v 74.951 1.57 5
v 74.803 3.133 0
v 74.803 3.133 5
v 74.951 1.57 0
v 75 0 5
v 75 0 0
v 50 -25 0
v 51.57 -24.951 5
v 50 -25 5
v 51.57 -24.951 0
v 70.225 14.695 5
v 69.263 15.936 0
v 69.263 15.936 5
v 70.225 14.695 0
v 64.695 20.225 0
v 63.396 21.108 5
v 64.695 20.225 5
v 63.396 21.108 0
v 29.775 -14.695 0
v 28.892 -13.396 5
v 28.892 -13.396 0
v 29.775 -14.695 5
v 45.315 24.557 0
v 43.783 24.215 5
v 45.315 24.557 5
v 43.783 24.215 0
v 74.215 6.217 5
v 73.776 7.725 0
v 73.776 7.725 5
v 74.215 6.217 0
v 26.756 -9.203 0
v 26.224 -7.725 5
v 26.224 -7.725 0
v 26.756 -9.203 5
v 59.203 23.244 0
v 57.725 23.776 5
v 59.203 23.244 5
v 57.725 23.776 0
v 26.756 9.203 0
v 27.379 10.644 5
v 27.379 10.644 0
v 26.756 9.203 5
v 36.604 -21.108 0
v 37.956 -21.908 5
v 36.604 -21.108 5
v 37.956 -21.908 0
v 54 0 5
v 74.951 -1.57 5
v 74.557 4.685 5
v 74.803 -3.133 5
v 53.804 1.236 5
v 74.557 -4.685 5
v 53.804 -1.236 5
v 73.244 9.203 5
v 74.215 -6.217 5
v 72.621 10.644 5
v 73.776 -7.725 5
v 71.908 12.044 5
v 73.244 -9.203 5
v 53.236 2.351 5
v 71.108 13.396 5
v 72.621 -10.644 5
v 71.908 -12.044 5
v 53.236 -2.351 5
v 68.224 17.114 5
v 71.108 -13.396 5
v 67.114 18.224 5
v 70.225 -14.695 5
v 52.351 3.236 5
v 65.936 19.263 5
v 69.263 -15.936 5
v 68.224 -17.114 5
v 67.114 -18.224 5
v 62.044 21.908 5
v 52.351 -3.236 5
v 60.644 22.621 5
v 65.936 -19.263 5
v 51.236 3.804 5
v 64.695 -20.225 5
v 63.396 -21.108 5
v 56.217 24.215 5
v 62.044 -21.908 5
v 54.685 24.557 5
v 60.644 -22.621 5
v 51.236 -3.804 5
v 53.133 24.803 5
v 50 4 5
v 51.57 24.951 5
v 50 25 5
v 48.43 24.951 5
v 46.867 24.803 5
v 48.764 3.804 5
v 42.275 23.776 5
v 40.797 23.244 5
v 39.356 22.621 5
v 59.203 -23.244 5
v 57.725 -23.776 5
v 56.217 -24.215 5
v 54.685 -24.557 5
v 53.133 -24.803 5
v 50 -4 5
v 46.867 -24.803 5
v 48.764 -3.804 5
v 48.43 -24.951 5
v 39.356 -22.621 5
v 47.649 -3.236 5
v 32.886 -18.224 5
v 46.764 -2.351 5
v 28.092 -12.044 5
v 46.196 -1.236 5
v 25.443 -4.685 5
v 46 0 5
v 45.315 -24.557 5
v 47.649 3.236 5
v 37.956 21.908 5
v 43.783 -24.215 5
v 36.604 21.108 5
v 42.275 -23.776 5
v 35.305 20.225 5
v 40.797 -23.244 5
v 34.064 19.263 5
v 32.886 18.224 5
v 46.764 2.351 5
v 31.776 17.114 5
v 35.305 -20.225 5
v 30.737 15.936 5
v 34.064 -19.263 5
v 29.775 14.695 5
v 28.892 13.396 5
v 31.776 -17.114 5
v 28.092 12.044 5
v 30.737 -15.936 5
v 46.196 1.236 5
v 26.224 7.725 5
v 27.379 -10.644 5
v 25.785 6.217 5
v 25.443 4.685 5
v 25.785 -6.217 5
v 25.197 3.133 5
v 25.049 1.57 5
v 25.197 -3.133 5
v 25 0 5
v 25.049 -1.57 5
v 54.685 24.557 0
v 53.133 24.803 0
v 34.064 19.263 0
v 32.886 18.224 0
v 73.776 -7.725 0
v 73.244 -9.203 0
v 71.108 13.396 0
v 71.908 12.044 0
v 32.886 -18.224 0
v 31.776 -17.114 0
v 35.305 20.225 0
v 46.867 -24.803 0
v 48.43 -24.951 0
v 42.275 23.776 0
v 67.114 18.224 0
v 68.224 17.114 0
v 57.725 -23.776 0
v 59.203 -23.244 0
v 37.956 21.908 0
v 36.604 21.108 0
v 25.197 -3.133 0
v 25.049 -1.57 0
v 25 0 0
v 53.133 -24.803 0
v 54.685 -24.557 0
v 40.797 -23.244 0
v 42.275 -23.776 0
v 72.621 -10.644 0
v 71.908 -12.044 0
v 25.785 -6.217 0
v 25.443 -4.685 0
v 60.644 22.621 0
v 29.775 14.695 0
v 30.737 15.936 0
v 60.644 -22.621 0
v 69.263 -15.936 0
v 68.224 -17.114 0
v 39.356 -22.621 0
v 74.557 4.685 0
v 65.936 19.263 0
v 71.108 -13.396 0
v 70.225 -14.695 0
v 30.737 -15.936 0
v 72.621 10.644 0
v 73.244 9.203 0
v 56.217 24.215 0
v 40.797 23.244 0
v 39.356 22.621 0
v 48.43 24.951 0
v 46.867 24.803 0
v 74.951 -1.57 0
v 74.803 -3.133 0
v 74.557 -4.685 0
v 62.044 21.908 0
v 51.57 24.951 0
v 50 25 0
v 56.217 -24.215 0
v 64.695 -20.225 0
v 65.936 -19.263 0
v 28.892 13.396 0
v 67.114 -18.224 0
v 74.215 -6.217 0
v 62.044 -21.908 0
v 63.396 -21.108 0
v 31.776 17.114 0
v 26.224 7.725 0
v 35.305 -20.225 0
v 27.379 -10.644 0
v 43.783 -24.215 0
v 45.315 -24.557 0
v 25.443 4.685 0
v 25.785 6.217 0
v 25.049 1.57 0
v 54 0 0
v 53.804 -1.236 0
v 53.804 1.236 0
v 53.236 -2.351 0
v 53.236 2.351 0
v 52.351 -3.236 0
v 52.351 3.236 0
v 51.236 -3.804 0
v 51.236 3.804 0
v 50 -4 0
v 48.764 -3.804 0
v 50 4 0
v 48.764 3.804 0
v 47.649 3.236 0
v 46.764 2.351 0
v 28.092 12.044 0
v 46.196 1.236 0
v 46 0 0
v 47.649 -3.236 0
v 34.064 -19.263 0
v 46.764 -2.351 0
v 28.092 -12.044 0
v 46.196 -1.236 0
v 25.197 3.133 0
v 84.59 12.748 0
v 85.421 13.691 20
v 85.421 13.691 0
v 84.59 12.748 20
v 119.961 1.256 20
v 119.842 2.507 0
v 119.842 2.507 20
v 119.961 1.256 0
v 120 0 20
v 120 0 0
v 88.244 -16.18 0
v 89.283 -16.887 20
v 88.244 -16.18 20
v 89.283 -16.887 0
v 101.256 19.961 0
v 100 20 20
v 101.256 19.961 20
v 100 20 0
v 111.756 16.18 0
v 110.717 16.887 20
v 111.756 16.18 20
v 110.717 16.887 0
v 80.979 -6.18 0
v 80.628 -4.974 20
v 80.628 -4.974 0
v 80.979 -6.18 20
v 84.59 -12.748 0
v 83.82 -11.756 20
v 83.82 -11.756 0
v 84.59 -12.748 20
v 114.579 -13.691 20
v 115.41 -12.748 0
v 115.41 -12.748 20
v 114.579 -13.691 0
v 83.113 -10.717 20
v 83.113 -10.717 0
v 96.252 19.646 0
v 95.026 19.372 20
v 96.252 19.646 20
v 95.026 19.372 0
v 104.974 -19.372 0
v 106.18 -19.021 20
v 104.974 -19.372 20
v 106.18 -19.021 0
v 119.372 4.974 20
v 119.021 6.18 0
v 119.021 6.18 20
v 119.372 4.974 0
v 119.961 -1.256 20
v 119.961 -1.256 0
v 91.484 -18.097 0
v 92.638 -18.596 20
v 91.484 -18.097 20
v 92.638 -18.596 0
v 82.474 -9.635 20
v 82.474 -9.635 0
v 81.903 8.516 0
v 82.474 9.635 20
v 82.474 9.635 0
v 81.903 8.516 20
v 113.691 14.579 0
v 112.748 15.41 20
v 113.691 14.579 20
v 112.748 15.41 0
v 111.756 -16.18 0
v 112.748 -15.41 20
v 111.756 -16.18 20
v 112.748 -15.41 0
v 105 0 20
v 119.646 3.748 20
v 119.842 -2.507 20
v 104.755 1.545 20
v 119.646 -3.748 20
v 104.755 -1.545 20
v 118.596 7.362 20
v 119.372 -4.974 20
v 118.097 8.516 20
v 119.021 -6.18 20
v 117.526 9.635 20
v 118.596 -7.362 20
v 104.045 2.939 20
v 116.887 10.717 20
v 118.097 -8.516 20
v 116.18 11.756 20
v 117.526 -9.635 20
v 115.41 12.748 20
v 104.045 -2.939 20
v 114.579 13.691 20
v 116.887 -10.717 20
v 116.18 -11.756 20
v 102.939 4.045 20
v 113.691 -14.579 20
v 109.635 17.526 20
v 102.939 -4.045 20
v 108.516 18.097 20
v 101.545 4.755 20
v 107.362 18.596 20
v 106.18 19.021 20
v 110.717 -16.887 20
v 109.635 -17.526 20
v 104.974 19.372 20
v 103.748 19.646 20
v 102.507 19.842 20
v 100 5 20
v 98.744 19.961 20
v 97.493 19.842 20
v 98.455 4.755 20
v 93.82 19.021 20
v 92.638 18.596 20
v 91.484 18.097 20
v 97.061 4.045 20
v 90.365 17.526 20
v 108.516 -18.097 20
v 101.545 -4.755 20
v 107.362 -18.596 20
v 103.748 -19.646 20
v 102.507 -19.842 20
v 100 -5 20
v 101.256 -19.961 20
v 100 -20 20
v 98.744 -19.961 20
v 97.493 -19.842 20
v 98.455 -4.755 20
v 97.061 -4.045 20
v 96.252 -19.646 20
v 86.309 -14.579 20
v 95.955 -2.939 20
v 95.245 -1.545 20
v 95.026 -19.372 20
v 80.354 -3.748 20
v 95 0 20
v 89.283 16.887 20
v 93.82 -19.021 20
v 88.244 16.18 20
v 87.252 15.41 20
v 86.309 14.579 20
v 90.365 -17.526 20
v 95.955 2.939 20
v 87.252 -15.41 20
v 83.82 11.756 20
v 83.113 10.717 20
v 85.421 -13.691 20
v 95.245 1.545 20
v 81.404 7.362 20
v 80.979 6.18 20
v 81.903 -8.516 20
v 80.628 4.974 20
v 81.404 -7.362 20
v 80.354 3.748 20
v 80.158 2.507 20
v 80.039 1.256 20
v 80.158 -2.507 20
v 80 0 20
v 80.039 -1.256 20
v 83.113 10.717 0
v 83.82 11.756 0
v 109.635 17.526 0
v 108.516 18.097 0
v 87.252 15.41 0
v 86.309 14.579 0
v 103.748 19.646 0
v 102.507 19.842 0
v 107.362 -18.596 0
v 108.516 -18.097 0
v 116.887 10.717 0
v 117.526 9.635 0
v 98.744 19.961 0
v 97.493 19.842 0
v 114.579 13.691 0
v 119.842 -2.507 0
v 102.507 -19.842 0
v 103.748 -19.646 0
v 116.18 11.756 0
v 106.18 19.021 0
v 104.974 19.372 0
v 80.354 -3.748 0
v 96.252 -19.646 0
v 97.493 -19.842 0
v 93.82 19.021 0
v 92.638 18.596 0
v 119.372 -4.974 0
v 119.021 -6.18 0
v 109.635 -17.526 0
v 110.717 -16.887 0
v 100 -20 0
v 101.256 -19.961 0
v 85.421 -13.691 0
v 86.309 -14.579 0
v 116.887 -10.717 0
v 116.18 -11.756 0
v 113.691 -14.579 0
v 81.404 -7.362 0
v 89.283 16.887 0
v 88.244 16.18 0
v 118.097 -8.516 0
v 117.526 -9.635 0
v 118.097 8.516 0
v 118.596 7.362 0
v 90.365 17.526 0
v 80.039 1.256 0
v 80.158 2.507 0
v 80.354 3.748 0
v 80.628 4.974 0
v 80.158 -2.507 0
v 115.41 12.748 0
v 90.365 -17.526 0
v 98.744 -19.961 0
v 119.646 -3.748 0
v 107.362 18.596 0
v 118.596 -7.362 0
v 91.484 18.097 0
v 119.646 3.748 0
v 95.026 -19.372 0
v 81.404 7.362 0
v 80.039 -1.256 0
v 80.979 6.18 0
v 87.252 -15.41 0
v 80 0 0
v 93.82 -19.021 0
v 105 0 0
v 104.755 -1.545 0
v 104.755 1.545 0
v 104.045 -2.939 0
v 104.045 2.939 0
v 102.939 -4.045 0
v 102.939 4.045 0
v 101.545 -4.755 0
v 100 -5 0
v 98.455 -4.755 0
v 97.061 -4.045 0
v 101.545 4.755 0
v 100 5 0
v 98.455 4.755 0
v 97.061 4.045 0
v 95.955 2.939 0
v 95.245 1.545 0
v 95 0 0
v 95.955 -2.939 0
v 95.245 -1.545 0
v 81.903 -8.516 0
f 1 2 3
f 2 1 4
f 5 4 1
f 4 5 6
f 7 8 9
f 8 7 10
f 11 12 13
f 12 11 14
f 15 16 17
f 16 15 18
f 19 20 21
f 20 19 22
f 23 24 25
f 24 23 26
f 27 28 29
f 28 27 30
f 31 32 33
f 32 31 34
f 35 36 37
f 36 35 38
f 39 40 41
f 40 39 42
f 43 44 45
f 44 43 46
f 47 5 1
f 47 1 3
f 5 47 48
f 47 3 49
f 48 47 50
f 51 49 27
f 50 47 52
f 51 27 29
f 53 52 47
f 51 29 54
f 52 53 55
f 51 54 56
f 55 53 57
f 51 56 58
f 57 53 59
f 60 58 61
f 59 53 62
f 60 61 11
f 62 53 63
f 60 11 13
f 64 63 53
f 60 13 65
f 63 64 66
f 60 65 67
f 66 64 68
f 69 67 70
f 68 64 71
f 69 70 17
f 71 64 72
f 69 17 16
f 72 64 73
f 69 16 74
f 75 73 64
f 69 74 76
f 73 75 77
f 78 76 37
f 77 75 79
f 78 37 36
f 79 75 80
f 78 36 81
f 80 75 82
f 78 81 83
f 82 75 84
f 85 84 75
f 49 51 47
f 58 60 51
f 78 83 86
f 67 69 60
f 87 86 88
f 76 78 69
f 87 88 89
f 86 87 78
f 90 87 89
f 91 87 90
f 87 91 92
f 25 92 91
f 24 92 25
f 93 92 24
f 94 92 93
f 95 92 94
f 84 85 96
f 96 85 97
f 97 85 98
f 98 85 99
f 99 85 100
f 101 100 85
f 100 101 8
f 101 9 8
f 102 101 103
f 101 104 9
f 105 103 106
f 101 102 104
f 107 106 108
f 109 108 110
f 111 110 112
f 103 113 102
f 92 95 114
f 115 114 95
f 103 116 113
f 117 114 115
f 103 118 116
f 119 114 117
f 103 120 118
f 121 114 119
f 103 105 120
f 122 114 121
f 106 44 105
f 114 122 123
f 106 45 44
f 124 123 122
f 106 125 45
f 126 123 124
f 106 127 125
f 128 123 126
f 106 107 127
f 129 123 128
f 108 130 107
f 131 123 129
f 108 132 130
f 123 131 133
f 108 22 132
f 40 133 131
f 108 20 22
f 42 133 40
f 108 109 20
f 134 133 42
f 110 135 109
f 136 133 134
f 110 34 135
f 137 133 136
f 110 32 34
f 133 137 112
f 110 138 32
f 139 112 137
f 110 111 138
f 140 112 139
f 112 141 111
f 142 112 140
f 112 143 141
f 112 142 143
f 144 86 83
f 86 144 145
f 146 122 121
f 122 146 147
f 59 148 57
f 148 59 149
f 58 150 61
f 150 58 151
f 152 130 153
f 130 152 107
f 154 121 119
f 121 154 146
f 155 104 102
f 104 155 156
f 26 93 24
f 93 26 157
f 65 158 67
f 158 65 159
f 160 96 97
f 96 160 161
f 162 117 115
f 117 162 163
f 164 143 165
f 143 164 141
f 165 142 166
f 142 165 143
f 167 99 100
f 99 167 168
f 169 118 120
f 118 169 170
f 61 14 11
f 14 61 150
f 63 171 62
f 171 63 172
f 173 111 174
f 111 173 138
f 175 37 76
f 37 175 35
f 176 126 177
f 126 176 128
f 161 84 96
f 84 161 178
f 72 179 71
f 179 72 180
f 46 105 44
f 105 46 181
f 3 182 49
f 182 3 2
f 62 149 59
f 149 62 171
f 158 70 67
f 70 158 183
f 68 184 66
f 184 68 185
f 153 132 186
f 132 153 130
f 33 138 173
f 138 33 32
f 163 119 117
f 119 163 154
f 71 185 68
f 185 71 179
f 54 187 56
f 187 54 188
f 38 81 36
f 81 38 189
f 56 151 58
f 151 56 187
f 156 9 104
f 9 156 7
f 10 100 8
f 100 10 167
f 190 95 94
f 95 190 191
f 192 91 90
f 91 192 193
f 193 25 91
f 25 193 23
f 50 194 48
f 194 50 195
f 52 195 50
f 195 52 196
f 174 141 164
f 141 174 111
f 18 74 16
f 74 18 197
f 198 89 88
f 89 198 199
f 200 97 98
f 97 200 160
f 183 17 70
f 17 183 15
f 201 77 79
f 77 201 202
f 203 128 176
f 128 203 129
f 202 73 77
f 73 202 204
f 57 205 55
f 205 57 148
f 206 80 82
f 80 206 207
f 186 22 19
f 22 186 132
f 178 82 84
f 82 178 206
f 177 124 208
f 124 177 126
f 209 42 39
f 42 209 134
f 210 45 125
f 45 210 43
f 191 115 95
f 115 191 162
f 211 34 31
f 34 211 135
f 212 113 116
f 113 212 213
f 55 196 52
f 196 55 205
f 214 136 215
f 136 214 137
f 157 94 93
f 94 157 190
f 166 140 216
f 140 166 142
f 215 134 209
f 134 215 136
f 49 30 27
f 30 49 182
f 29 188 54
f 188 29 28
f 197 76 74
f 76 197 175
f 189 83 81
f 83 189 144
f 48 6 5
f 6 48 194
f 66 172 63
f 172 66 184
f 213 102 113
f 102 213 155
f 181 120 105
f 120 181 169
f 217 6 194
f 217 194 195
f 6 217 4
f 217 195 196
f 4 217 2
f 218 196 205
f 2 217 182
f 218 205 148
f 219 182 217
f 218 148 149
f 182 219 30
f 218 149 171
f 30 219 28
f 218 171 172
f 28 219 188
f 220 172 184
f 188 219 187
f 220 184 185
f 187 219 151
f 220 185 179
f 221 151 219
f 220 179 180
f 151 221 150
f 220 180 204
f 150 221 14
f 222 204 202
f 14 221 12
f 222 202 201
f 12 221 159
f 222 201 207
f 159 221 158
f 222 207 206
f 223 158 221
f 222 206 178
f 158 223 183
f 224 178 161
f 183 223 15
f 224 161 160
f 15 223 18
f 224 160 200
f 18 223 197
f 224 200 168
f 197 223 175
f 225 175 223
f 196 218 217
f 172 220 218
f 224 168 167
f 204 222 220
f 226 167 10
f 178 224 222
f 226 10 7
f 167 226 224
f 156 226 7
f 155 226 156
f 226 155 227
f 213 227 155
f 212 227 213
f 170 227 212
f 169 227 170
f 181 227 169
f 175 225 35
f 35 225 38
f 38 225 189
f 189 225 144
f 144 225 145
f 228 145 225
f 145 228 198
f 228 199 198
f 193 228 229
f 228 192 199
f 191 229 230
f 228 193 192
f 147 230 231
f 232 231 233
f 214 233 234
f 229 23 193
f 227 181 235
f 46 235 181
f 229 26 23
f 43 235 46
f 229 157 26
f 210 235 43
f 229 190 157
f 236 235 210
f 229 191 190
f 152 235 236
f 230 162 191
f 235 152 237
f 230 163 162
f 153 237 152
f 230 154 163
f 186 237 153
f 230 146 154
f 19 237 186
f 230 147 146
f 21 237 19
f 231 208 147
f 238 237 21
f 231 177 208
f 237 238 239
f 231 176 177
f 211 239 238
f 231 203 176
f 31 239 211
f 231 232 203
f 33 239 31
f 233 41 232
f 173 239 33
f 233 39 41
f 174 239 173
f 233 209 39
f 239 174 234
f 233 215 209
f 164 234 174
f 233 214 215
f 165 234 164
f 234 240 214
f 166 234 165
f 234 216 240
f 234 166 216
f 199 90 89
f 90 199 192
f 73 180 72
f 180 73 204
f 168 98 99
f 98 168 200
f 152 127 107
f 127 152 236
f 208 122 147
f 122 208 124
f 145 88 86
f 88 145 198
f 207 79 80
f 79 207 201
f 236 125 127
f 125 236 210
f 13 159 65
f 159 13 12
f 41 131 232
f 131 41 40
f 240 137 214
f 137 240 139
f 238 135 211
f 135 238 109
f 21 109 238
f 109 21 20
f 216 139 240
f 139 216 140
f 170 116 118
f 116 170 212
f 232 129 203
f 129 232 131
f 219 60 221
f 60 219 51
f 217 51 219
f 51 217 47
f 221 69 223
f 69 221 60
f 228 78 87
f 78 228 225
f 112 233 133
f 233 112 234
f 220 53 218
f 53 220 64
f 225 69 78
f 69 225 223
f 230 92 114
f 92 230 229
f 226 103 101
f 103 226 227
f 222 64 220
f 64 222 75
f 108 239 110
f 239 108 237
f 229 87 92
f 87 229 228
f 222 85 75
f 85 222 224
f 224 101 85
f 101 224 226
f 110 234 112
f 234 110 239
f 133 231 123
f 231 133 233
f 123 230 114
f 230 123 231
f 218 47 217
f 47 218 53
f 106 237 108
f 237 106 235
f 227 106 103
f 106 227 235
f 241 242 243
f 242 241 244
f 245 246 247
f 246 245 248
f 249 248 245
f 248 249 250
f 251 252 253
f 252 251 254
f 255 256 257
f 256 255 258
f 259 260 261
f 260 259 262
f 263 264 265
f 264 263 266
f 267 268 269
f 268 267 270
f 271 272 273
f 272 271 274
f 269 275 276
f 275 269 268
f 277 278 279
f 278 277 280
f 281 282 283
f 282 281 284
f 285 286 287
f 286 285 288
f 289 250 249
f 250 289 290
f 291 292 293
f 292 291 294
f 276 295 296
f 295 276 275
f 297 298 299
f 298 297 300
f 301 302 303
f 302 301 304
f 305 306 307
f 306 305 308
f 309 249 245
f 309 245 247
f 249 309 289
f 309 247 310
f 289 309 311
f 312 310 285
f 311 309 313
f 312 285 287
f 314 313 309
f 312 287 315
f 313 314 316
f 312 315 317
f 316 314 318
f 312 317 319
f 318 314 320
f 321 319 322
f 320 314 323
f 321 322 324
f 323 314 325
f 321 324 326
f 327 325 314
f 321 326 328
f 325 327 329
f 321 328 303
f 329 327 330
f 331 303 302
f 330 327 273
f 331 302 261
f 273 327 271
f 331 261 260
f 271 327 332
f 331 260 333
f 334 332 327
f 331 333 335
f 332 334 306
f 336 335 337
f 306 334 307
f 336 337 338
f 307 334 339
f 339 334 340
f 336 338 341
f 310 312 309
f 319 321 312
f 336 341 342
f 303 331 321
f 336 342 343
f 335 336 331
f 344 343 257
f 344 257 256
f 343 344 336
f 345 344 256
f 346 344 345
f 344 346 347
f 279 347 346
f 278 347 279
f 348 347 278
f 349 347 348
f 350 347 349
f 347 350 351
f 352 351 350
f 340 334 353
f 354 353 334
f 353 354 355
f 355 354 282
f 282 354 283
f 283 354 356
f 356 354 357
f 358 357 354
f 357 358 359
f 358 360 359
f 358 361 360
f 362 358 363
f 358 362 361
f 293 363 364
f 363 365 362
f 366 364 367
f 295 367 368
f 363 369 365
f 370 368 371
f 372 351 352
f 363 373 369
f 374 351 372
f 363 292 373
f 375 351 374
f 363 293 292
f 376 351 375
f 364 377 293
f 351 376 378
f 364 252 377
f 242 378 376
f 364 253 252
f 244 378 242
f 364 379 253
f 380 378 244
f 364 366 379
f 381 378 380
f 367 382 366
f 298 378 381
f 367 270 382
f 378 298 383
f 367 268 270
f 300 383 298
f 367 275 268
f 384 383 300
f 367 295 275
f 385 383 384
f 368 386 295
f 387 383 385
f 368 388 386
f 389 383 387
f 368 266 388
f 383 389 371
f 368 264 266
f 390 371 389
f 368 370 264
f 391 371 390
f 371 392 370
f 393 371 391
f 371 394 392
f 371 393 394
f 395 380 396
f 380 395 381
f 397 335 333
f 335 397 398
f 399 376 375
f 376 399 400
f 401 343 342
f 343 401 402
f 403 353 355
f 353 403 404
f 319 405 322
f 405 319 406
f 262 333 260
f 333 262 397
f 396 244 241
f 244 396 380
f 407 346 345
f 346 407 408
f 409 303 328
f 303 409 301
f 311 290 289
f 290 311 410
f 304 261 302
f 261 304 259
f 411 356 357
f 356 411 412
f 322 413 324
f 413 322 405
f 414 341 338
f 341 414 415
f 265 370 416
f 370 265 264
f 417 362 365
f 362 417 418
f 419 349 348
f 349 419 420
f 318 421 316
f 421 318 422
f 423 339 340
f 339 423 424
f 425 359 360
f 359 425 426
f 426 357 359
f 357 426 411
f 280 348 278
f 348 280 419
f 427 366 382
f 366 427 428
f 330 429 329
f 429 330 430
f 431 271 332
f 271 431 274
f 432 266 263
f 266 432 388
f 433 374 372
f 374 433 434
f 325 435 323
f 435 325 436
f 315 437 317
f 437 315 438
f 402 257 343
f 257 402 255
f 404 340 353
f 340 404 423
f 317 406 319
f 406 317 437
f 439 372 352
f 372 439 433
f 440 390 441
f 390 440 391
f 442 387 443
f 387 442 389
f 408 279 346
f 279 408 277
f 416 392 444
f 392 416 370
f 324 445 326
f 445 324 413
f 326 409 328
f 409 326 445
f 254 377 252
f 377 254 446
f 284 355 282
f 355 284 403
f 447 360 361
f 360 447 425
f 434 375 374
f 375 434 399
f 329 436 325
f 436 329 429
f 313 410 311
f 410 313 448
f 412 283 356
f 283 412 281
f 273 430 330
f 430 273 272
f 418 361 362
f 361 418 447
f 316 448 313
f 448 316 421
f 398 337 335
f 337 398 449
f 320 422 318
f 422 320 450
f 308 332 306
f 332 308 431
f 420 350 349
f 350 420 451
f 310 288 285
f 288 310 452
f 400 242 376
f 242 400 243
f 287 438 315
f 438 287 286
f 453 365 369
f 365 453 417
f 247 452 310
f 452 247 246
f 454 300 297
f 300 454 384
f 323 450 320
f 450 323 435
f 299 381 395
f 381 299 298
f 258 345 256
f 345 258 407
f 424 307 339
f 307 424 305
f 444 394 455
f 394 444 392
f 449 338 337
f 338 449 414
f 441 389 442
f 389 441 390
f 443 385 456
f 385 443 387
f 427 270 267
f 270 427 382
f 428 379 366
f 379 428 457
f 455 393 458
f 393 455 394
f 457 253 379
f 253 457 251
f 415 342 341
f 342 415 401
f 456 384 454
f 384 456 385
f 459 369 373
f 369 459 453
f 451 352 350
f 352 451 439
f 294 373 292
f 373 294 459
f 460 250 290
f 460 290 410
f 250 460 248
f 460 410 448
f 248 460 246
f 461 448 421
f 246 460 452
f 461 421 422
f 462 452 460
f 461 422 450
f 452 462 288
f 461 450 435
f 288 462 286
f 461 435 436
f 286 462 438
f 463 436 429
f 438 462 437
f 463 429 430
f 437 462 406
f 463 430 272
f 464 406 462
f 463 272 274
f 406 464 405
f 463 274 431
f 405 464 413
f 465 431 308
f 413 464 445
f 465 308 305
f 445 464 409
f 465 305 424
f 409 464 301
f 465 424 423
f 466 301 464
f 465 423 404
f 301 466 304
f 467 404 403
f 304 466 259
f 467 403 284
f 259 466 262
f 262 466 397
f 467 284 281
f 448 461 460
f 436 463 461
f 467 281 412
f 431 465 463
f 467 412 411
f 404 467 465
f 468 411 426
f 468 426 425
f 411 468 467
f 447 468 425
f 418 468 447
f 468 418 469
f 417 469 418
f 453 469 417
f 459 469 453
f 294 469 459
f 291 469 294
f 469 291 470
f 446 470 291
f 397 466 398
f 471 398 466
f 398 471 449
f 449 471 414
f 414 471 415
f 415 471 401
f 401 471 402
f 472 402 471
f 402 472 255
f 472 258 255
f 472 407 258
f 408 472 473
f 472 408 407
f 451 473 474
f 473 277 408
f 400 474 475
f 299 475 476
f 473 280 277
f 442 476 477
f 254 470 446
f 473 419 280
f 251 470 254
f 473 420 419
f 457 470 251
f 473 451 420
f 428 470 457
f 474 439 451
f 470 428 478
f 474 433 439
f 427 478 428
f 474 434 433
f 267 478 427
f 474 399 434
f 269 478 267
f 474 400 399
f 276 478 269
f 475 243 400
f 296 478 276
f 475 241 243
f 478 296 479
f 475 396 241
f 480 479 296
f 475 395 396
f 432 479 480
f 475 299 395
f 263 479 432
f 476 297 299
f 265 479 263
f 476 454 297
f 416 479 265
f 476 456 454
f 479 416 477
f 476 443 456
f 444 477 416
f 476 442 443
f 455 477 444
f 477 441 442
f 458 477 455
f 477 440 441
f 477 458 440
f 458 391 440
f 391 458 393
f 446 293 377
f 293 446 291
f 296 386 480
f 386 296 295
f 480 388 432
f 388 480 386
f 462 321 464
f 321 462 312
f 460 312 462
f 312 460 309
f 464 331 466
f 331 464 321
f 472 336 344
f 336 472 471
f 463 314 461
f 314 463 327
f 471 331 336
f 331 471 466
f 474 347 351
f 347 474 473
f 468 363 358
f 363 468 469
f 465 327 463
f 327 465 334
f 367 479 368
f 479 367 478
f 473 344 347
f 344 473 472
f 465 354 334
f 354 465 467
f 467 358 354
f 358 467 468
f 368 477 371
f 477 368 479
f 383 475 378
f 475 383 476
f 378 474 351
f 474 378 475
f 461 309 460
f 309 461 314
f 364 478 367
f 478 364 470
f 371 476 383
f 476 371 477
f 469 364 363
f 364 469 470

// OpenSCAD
// Partiendo del ejemplo anterior de la rueda parametrizable, vamos a ver
//     cómo utilizar módulos en nuestros diseños.
//  Los módulos son muy importantes porque nos van a permitir reutilizar
//      nuestro código dentro y fuera del programa actual. Podemos por
//      tanto, tener nuestras propias bibliotecas de objetos.

module rueda_simple(grosor, diametro, diam_eje){
    // La definición de un módulo es muy sencilla, simplemente ponemos
    //     la palabra clave MODULE, seguido del nombre que queremos asignar
    //     para identificar el módulo, y los parámetros de nuestra función.


    // Cilindro con agujero centrarl
    difference(){
        // Cilindro exterior
        cylinder(r=diametro/2, h=grosor, $fn=100);
        // Cilindro taladro central.
        cylinder(r=diam_eje/2, h=grosor*3, $fn=20, center=true);
        // NOTA: Multiplicamos por 3 la altura para asegurar que se
        //     atraviesa completamente la figura.
        }
    }
    
// Utilizando el módulo anterior, generamos una rueda de ejemplo:
translate([50, 0, 0]){
    rueda_simple(grosor=5, diametro=50, diam_eje=8);
    // NOTA: Los parámetros de entrada podemos pasarlos en cualquier orden.
}

// Añadimos una segunda rueda de manera sencilla
translate([100, 0, 0]){
    rueda_simple(grosor=20, diametro=40, diam_eje=10);
    // NOTA: Los parámetros de entrada podemos pasarlos en cualquier orden.
}
